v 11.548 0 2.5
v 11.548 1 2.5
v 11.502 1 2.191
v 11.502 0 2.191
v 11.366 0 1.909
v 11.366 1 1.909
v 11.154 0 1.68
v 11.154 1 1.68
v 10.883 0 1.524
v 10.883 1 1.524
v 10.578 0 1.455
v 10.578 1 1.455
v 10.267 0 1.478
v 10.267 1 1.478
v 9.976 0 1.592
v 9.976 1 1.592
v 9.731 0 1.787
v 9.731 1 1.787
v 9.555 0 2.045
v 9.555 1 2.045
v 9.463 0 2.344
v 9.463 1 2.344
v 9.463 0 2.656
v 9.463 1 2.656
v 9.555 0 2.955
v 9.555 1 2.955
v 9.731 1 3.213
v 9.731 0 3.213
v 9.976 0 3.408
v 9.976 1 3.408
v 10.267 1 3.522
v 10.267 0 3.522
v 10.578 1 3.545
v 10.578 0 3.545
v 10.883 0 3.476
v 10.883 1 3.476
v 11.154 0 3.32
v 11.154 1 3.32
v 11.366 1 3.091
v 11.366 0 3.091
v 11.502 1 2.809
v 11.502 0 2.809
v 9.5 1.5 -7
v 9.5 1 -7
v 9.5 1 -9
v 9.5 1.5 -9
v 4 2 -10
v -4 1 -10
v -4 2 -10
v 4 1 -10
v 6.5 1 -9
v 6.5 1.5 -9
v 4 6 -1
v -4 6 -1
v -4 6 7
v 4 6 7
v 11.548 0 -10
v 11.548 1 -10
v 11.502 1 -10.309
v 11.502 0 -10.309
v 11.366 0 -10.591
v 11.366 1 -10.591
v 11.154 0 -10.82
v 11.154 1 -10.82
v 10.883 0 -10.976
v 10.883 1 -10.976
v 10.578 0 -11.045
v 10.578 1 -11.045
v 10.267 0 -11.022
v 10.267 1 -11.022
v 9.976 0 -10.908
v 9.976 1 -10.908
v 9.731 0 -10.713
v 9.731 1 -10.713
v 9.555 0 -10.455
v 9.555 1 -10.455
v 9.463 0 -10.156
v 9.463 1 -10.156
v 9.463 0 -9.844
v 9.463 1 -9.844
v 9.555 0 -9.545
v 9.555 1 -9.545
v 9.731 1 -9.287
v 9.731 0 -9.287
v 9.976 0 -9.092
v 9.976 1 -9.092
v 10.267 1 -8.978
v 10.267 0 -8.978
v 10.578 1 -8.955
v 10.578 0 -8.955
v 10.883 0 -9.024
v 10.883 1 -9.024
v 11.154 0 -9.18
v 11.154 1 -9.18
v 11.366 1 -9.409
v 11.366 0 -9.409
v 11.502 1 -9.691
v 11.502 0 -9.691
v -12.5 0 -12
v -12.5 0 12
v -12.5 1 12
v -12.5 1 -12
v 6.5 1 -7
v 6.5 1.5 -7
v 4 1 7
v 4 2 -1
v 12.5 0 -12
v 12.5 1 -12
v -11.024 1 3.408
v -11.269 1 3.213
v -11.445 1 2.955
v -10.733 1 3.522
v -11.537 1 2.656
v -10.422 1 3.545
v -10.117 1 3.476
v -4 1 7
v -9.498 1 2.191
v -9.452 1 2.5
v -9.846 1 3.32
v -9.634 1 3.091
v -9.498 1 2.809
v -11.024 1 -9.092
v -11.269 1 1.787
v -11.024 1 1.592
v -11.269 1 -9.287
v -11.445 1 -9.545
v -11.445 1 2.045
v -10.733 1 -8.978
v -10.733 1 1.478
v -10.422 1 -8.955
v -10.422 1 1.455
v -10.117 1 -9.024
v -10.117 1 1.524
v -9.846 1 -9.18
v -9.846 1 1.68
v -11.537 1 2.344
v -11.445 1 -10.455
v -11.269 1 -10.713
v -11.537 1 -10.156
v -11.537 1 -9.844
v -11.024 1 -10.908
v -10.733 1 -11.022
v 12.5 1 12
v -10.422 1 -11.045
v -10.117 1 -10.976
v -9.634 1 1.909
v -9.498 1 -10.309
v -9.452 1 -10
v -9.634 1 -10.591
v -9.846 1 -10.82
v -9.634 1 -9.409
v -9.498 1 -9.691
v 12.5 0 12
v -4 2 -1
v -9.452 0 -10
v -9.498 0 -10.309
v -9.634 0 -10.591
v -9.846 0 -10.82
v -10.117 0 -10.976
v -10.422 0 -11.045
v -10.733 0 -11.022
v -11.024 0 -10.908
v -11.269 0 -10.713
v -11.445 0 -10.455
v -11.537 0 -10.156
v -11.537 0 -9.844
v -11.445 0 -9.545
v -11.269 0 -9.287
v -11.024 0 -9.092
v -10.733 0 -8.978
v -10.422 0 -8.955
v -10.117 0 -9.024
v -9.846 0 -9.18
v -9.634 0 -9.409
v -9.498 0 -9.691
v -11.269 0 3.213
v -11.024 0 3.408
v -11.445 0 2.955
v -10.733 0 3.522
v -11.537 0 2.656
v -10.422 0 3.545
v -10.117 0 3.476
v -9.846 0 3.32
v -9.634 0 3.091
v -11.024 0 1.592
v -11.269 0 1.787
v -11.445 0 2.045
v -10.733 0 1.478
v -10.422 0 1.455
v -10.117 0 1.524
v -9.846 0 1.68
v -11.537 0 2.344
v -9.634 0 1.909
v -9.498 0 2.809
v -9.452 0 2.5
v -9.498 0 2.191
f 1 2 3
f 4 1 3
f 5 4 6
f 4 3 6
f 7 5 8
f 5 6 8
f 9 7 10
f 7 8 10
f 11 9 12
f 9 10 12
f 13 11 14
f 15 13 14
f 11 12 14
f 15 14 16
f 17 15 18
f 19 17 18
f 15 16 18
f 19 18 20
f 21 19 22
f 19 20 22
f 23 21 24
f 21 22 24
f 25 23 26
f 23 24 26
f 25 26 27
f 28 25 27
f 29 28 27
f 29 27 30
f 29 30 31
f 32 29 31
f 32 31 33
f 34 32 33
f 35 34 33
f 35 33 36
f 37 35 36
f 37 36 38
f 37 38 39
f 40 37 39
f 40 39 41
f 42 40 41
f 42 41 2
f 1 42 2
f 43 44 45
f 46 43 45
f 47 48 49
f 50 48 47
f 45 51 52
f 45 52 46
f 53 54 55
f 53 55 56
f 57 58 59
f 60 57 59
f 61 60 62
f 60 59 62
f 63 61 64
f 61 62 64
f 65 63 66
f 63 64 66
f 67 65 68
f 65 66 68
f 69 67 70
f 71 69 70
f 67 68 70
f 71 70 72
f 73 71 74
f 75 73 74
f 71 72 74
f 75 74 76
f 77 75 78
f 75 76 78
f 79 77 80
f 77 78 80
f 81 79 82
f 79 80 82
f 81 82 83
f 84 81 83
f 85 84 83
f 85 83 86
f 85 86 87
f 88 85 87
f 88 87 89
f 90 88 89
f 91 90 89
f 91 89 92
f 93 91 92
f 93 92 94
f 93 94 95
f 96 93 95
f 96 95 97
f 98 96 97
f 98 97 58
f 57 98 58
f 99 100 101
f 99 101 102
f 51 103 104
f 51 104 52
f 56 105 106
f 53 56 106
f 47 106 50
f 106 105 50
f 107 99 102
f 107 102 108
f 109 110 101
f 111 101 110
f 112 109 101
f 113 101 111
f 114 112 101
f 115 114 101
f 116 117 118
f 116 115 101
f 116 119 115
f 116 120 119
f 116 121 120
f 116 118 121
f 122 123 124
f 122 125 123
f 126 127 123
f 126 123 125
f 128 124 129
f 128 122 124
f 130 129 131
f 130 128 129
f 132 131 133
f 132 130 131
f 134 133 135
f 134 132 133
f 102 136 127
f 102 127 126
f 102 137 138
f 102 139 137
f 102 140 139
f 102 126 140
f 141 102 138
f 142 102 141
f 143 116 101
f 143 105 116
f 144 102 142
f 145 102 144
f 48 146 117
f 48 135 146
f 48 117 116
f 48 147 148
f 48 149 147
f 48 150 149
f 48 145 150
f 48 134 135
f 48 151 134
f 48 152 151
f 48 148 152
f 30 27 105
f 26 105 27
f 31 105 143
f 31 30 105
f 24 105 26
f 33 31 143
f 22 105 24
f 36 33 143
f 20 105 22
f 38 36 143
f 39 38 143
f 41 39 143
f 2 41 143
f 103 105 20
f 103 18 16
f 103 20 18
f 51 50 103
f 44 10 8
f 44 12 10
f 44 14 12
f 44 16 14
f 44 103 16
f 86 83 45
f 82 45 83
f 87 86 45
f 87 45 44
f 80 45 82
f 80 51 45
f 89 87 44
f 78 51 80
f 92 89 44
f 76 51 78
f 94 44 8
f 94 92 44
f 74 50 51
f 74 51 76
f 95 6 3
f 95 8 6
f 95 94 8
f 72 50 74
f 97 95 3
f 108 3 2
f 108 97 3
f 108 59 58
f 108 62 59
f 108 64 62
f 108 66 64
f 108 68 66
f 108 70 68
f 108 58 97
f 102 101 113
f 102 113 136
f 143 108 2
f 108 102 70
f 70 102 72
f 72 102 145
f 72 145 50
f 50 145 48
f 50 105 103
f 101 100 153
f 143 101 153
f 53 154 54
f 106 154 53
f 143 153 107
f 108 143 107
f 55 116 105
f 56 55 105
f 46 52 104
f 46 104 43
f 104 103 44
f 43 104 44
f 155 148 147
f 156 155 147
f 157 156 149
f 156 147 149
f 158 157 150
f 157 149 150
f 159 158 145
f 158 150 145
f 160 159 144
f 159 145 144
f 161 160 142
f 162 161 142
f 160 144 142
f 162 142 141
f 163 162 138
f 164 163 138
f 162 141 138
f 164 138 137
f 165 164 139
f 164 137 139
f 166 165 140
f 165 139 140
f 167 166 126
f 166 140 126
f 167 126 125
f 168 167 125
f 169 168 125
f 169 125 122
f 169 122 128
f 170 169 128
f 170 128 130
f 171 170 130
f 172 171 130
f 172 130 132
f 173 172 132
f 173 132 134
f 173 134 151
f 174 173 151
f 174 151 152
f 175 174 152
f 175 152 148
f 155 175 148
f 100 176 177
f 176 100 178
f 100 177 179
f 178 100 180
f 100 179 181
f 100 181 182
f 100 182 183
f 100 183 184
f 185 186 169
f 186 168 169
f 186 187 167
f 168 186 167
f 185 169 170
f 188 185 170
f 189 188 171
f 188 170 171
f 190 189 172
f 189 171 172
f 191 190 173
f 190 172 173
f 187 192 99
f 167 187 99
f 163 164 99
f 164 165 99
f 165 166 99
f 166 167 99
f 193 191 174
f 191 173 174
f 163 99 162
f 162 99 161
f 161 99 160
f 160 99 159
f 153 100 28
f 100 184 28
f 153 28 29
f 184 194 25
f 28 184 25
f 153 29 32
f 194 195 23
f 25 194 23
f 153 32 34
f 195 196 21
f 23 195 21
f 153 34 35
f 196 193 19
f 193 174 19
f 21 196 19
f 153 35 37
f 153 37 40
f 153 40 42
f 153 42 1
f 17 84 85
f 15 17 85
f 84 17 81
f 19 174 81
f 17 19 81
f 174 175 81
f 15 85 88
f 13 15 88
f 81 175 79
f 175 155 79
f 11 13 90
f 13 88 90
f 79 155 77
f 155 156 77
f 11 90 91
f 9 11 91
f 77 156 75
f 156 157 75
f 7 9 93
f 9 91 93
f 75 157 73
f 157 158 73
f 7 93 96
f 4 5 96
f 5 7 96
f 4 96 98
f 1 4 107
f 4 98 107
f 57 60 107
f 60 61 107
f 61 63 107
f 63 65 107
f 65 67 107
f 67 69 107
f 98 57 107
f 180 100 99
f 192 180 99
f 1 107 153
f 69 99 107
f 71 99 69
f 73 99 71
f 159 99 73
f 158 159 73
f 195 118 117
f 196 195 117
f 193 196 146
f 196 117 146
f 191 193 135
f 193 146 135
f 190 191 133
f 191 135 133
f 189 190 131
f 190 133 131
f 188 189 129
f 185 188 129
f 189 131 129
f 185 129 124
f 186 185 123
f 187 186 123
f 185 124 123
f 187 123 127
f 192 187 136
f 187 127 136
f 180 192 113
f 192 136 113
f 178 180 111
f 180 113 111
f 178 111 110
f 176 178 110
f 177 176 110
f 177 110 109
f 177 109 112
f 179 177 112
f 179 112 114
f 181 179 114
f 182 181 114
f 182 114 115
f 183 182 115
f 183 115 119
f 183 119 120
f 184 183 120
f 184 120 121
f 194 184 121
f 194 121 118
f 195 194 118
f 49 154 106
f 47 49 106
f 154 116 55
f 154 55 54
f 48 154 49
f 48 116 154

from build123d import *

# Parameters (mm, degrees)
SKETCH1_W           = 25
SKETCH1_H           = 24
BOSS_EXTRUDE1_DEPTH = 1
SKETCH2_W           = 8
SKETCH2_H           = 8
BOSS_EXTRUDE2_DEPTH = 5
SKETCH3_W           = 8
SKETCH3_H           = 9
BOSS_EXTRUDE3_DEPTH = 1
SKETCH4_W           = 3
SKETCH4_H           = 2
BOSS_EXTRUDE4_DEPTH = 0.5
CUT_EXTRUDE1_REACH  = 3
SKETCH5_R           = 1.048419625


with BuildPart() as part:
    # Sketch1 → Boss-Extrude1 (new body)
    with BuildSketch(Plane(origin=(0, 0, 0), x_dir=(1, 0, 0), z_dir=(0, 1, 0))):
        Rectangle(SKETCH1_W, SKETCH1_H)
    extrude(amount=BOSS_EXTRUDE1_DEPTH)

    # Sketch2 → Boss-Extrude2 (add)
    with BuildSketch(Plane(origin=(0, 1, 0), x_dir=(1, 0, 0), z_dir=(0, 1, 0))):
        with Locations((0, -3)):
            Rectangle(SKETCH2_W, SKETCH2_H)
    extrude(amount=BOSS_EXTRUDE2_DEPTH)

    # Sketch3 → Boss-Extrude3 (add)
    with BuildSketch(Plane(origin=(0, 1, 0), x_dir=(1, 0, 0), z_dir=(0, 1, 0))):
        with Locations((0, 5.5)):
            Rectangle(SKETCH3_W, SKETCH3_H)
    extrude(amount=BOSS_EXTRUDE3_DEPTH)

    # Sketch4 → Boss-Extrude4 (add)
    with BuildSketch(Plane(origin=(0, 1, 0), x_dir=(1, 0, 0), z_dir=(0, 1, 0))):
        with Locations((8, 8)):
            Rectangle(SKETCH4_W, SKETCH4_H)
    extrude(amount=BOSS_EXTRUDE4_DEPTH)

    # Sketch5 → Cut-Extrude1 (cut, up to next)
    with BuildSketch(Plane(origin=(0, 1, 0), x_dir=(1, 0, 0), z_dir=(0, 1, 0)), mode=Mode.PRIVATE) as cut_extrude1_sk1:
        with Locations((-10.5, 10)):
            Circle(SKETCH5_R)
    cut_extrude1_tool1 = extrude(cut_extrude1_sk1.sketch, amount=-CUT_EXTRUDE1_REACH, mode=Mode.PRIVATE) & part.part
    add(cut_extrude1_tool1.solids().sort_by_distance((-10.5, 1, -10))[0], mode=Mode.SUBTRACT)
    # Sketch5 → Cut-Extrude1 (cut, up to next)
    with BuildSketch(Plane(origin=(0, 1, 0), x_dir=(1, 0, 0), z_dir=(0, 1, 0)), mode=Mode.PRIVATE) as cut_extrude1_sk2:
        with Locations((10.5, 10)):
            Circle(SKETCH5_R)
    cut_extrude1_tool2 = extrude(cut_extrude1_sk2.sketch, amount=-CUT_EXTRUDE1_REACH, mode=Mode.PRIVATE) & part.part
    add(cut_extrude1_tool2.solids().sort_by_distance((10.5, 1, -10))[0], mode=Mode.SUBTRACT)
    # Sketch5 → Cut-Extrude1 (cut, up to next)
    with BuildSketch(Plane(origin=(0, 1, 0), x_dir=(1, 0, 0), z_dir=(0, 1, 0)), mode=Mode.PRIVATE) as cut_extrude1_sk3:
        with Locations((10.5, -2.5)):
            Circle(SKETCH5_R)
    cut_extrude1_tool3 = extrude(cut_extrude1_sk3.sketch, amount=-CUT_EXTRUDE1_REACH, mode=Mode.PRIVATE) & part.part
    add(cut_extrude1_tool3.solids().sort_by_distance((10.5, 1, 2.5))[0], mode=Mode.SUBTRACT)
    # Sketch5 → Cut-Extrude1 (cut, up to next)
    with BuildSketch(Plane(origin=(0, 1, 0), x_dir=(1, 0, 0), z_dir=(0, 1, 0)), mode=Mode.PRIVATE) as cut_extrude1_sk4:
        with Locations((-10.5, -2.5)):
            Circle(SKETCH5_R)
    cut_extrude1_tool4 = extrude(cut_extrude1_sk4.sketch, amount=-CUT_EXTRUDE1_REACH, mode=Mode.PRIVATE) & part.part
    add(cut_extrude1_tool4.solids().sort_by_distance((-10.5, 1, 2.5))[0], mode=Mode.SUBTRACT)


solid = part.part
